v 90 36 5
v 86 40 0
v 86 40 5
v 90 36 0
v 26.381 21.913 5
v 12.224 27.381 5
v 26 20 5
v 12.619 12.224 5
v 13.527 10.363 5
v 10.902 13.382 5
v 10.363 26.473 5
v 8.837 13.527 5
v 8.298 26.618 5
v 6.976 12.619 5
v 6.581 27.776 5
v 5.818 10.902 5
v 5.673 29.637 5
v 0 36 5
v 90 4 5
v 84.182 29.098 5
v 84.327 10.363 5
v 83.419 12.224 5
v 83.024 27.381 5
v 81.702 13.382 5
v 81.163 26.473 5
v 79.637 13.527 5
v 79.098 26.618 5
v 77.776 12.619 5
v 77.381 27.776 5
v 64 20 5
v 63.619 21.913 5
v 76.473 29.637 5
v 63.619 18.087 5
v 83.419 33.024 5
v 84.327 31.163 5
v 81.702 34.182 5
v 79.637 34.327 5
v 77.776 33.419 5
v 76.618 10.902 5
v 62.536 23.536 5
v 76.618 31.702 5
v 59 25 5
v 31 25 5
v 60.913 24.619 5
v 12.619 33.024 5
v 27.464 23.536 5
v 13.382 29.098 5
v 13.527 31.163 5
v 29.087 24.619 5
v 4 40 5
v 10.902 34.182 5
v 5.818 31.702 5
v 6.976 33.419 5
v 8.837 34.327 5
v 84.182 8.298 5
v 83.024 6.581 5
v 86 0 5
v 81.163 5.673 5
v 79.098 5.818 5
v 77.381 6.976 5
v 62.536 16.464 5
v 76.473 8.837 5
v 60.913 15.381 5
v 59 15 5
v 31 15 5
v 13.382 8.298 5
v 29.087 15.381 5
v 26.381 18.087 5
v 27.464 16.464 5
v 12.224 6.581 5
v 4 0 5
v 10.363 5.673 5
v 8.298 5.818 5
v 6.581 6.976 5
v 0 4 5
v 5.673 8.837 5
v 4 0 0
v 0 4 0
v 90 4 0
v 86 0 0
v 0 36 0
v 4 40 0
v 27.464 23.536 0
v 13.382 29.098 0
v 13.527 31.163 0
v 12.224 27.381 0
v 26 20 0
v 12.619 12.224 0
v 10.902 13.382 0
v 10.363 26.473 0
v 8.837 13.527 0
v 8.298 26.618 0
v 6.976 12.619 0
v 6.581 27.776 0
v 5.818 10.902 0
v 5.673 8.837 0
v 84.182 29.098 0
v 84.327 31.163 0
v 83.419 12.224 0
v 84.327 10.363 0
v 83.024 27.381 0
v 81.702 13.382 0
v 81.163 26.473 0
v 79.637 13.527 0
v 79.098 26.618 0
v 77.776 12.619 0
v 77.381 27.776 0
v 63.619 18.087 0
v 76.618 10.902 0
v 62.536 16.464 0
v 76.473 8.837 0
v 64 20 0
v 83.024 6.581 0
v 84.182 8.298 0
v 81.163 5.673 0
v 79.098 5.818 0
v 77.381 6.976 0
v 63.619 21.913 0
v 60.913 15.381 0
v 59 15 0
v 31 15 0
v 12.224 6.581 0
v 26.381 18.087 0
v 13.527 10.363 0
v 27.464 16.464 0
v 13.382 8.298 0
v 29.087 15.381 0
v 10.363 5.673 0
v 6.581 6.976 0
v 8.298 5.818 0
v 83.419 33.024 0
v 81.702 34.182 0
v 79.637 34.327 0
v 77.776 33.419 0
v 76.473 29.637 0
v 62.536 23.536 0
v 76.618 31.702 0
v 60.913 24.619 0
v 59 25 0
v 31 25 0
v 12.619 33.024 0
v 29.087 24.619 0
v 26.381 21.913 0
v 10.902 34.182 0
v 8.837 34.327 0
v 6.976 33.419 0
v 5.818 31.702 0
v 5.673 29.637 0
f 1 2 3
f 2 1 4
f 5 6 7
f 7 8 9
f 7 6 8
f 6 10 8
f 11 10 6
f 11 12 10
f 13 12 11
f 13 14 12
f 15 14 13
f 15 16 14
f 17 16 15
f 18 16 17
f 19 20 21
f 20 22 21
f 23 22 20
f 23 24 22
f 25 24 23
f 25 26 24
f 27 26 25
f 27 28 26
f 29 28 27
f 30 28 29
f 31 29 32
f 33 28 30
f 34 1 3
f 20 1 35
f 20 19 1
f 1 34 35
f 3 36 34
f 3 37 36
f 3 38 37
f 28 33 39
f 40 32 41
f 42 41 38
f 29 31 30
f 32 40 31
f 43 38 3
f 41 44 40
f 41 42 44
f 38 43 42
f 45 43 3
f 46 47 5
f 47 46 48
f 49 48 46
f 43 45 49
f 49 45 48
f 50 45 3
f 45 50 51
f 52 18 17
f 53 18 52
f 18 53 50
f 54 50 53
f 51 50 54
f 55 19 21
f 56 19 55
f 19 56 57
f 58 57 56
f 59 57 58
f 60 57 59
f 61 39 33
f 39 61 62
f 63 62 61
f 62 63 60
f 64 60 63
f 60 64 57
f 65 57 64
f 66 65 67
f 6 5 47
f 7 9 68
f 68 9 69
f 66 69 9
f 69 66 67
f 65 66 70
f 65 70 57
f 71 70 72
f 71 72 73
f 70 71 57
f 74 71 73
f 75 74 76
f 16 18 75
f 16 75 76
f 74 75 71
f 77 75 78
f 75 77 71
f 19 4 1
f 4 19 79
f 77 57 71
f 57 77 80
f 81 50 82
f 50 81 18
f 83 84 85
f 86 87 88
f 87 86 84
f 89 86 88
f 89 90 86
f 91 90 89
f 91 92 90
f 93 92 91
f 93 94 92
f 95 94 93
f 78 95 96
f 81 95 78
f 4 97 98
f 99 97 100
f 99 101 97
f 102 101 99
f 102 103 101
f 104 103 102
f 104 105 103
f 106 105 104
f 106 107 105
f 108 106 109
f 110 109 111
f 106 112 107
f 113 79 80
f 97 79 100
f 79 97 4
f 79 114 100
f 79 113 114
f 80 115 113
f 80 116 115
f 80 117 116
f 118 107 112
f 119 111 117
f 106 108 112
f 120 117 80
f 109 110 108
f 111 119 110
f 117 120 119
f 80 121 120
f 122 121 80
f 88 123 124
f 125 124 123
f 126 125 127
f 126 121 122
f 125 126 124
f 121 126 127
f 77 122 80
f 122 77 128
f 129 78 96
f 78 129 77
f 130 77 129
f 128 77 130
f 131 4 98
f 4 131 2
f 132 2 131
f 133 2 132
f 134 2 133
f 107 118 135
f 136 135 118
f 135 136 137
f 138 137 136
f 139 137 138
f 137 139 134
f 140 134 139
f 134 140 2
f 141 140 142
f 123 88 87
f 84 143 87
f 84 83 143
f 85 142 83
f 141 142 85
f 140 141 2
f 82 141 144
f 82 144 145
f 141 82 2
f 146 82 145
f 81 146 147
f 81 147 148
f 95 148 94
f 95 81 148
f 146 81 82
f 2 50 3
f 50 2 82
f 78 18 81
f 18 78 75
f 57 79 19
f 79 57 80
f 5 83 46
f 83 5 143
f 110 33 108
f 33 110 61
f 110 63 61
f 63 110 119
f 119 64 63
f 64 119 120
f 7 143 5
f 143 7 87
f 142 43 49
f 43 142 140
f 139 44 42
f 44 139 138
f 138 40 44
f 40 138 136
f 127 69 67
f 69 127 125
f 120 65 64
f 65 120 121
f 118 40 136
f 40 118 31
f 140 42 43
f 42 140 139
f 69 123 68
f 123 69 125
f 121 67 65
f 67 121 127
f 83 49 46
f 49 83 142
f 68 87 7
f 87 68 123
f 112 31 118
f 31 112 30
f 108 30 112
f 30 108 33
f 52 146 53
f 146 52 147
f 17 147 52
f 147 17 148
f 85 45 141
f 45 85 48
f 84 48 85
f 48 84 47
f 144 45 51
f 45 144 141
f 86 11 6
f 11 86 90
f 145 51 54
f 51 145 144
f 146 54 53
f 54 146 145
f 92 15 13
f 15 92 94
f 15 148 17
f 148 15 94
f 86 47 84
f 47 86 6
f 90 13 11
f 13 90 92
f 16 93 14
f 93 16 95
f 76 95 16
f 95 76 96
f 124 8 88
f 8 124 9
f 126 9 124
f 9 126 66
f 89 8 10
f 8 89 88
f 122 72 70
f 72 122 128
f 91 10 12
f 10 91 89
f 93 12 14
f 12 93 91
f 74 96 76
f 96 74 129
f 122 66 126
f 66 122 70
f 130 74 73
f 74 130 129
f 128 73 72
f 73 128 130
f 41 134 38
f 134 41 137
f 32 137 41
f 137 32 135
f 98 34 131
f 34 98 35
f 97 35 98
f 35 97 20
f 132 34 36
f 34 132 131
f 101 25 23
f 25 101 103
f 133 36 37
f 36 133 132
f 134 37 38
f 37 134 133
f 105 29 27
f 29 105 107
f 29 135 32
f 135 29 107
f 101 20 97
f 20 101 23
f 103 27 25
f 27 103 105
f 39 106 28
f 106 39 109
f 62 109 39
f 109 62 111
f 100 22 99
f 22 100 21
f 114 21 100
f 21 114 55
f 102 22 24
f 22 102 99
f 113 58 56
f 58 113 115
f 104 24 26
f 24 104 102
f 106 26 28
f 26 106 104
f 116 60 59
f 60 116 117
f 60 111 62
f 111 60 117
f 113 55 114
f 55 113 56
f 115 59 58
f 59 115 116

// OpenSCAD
$fn = 32;

// ----------------------------------------------------------------------
// Bracket plate: slot plate 90 x 40
// ----------------------------------------------------------------------

// --- parameters (mm) ---
hole_r = 4;               // bolt hole radius
plate_t = 5;              // plate thickness, Z (extrusion height)
plate_l = 90;             // plate length
plate_w = 40;             // plate width
slot_l = 28;              // slot straight length
slot_r = 5;               // slot end radius

slot_len = slot_l + 2 * slot_r;
slot_w = 2 * slot_r;
hole_d2 = 2 * hole_r;

profile = [[4, 0], [86, 0], [90, 4], [90, 36], [86, 40], [4, 40], [0, 36], [0, 4]];  // primary outline, 8 points, counter clockwise
void_1 = [[59, 15], [60.913, 15.381], [62.536, 16.464], [63.619, 18.087], [64, 20], [63.619, 21.913], [62.536, 23.536], [60.913, 24.619], [59, 25], [31, 25], [29.087, 24.619], [27.464, 23.536], [26.381, 21.913], [26, 20], [26.381, 18.087], [27.464, 16.464], [29.087, 15.381], [31, 15]];  // grip slot, 18 points
void_2 = [[13.527, 31.163], [12.619, 33.024], [10.902, 34.182], [8.837, 34.327], [6.976, 33.419], [5.818, 31.702], [5.673, 29.637], [6.581, 27.776], [8.298, 26.618], [10.363, 26.473], [12.224, 27.381], [13.382, 29.098]];  // corner hole, 12 points
void_3 = [[13.527, 10.363], [12.619, 12.224], [10.902, 13.382], [8.837, 13.527], [6.976, 12.619], [5.818, 10.902], [5.673, 8.837], [6.581, 6.976], [8.298, 5.818], [10.363, 5.673], [12.224, 6.581], [13.382, 8.298]];  // corner hole, 12 points
void_4 = [[84.327, 31.163], [83.419, 33.024], [81.702, 34.182], [79.637, 34.327], [77.776, 33.419], [76.618, 31.702], [76.473, 29.637], [77.381, 27.776], [79.098, 26.618], [81.163, 26.473], [83.024, 27.381], [84.182, 29.098]];  // corner hole, 12 points
void_5 = [[84.327, 10.363], [83.419, 12.224], [81.702, 13.382], [79.637, 13.527], [77.776, 12.619], [76.618, 10.902], [76.473, 8.837], [77.381, 6.976], [79.098, 5.818], [81.163, 5.673], [83.024, 6.581], [84.182, 8.298]];  // corner hole, 12 points

// --- the one profile operation ---
difference() {
  linear_extrude(height = plate_t) polygon(points = profile);
  translate([0, 0, -1])
    linear_extrude(height = plate_t + 2) polygon(points = void_1);
  translate([0, 0, -1])
    linear_extrude(height = plate_t + 2) polygon(points = void_2);
  translate([0, 0, -1])
    linear_extrude(height = plate_t + 2) polygon(points = void_3);
  translate([0, 0, -1])
    linear_extrude(height = plate_t + 2) polygon(points = void_4);
  translate([0, 0, -1])
    linear_extrude(height = plate_t + 2) polygon(points = void_5);
}
